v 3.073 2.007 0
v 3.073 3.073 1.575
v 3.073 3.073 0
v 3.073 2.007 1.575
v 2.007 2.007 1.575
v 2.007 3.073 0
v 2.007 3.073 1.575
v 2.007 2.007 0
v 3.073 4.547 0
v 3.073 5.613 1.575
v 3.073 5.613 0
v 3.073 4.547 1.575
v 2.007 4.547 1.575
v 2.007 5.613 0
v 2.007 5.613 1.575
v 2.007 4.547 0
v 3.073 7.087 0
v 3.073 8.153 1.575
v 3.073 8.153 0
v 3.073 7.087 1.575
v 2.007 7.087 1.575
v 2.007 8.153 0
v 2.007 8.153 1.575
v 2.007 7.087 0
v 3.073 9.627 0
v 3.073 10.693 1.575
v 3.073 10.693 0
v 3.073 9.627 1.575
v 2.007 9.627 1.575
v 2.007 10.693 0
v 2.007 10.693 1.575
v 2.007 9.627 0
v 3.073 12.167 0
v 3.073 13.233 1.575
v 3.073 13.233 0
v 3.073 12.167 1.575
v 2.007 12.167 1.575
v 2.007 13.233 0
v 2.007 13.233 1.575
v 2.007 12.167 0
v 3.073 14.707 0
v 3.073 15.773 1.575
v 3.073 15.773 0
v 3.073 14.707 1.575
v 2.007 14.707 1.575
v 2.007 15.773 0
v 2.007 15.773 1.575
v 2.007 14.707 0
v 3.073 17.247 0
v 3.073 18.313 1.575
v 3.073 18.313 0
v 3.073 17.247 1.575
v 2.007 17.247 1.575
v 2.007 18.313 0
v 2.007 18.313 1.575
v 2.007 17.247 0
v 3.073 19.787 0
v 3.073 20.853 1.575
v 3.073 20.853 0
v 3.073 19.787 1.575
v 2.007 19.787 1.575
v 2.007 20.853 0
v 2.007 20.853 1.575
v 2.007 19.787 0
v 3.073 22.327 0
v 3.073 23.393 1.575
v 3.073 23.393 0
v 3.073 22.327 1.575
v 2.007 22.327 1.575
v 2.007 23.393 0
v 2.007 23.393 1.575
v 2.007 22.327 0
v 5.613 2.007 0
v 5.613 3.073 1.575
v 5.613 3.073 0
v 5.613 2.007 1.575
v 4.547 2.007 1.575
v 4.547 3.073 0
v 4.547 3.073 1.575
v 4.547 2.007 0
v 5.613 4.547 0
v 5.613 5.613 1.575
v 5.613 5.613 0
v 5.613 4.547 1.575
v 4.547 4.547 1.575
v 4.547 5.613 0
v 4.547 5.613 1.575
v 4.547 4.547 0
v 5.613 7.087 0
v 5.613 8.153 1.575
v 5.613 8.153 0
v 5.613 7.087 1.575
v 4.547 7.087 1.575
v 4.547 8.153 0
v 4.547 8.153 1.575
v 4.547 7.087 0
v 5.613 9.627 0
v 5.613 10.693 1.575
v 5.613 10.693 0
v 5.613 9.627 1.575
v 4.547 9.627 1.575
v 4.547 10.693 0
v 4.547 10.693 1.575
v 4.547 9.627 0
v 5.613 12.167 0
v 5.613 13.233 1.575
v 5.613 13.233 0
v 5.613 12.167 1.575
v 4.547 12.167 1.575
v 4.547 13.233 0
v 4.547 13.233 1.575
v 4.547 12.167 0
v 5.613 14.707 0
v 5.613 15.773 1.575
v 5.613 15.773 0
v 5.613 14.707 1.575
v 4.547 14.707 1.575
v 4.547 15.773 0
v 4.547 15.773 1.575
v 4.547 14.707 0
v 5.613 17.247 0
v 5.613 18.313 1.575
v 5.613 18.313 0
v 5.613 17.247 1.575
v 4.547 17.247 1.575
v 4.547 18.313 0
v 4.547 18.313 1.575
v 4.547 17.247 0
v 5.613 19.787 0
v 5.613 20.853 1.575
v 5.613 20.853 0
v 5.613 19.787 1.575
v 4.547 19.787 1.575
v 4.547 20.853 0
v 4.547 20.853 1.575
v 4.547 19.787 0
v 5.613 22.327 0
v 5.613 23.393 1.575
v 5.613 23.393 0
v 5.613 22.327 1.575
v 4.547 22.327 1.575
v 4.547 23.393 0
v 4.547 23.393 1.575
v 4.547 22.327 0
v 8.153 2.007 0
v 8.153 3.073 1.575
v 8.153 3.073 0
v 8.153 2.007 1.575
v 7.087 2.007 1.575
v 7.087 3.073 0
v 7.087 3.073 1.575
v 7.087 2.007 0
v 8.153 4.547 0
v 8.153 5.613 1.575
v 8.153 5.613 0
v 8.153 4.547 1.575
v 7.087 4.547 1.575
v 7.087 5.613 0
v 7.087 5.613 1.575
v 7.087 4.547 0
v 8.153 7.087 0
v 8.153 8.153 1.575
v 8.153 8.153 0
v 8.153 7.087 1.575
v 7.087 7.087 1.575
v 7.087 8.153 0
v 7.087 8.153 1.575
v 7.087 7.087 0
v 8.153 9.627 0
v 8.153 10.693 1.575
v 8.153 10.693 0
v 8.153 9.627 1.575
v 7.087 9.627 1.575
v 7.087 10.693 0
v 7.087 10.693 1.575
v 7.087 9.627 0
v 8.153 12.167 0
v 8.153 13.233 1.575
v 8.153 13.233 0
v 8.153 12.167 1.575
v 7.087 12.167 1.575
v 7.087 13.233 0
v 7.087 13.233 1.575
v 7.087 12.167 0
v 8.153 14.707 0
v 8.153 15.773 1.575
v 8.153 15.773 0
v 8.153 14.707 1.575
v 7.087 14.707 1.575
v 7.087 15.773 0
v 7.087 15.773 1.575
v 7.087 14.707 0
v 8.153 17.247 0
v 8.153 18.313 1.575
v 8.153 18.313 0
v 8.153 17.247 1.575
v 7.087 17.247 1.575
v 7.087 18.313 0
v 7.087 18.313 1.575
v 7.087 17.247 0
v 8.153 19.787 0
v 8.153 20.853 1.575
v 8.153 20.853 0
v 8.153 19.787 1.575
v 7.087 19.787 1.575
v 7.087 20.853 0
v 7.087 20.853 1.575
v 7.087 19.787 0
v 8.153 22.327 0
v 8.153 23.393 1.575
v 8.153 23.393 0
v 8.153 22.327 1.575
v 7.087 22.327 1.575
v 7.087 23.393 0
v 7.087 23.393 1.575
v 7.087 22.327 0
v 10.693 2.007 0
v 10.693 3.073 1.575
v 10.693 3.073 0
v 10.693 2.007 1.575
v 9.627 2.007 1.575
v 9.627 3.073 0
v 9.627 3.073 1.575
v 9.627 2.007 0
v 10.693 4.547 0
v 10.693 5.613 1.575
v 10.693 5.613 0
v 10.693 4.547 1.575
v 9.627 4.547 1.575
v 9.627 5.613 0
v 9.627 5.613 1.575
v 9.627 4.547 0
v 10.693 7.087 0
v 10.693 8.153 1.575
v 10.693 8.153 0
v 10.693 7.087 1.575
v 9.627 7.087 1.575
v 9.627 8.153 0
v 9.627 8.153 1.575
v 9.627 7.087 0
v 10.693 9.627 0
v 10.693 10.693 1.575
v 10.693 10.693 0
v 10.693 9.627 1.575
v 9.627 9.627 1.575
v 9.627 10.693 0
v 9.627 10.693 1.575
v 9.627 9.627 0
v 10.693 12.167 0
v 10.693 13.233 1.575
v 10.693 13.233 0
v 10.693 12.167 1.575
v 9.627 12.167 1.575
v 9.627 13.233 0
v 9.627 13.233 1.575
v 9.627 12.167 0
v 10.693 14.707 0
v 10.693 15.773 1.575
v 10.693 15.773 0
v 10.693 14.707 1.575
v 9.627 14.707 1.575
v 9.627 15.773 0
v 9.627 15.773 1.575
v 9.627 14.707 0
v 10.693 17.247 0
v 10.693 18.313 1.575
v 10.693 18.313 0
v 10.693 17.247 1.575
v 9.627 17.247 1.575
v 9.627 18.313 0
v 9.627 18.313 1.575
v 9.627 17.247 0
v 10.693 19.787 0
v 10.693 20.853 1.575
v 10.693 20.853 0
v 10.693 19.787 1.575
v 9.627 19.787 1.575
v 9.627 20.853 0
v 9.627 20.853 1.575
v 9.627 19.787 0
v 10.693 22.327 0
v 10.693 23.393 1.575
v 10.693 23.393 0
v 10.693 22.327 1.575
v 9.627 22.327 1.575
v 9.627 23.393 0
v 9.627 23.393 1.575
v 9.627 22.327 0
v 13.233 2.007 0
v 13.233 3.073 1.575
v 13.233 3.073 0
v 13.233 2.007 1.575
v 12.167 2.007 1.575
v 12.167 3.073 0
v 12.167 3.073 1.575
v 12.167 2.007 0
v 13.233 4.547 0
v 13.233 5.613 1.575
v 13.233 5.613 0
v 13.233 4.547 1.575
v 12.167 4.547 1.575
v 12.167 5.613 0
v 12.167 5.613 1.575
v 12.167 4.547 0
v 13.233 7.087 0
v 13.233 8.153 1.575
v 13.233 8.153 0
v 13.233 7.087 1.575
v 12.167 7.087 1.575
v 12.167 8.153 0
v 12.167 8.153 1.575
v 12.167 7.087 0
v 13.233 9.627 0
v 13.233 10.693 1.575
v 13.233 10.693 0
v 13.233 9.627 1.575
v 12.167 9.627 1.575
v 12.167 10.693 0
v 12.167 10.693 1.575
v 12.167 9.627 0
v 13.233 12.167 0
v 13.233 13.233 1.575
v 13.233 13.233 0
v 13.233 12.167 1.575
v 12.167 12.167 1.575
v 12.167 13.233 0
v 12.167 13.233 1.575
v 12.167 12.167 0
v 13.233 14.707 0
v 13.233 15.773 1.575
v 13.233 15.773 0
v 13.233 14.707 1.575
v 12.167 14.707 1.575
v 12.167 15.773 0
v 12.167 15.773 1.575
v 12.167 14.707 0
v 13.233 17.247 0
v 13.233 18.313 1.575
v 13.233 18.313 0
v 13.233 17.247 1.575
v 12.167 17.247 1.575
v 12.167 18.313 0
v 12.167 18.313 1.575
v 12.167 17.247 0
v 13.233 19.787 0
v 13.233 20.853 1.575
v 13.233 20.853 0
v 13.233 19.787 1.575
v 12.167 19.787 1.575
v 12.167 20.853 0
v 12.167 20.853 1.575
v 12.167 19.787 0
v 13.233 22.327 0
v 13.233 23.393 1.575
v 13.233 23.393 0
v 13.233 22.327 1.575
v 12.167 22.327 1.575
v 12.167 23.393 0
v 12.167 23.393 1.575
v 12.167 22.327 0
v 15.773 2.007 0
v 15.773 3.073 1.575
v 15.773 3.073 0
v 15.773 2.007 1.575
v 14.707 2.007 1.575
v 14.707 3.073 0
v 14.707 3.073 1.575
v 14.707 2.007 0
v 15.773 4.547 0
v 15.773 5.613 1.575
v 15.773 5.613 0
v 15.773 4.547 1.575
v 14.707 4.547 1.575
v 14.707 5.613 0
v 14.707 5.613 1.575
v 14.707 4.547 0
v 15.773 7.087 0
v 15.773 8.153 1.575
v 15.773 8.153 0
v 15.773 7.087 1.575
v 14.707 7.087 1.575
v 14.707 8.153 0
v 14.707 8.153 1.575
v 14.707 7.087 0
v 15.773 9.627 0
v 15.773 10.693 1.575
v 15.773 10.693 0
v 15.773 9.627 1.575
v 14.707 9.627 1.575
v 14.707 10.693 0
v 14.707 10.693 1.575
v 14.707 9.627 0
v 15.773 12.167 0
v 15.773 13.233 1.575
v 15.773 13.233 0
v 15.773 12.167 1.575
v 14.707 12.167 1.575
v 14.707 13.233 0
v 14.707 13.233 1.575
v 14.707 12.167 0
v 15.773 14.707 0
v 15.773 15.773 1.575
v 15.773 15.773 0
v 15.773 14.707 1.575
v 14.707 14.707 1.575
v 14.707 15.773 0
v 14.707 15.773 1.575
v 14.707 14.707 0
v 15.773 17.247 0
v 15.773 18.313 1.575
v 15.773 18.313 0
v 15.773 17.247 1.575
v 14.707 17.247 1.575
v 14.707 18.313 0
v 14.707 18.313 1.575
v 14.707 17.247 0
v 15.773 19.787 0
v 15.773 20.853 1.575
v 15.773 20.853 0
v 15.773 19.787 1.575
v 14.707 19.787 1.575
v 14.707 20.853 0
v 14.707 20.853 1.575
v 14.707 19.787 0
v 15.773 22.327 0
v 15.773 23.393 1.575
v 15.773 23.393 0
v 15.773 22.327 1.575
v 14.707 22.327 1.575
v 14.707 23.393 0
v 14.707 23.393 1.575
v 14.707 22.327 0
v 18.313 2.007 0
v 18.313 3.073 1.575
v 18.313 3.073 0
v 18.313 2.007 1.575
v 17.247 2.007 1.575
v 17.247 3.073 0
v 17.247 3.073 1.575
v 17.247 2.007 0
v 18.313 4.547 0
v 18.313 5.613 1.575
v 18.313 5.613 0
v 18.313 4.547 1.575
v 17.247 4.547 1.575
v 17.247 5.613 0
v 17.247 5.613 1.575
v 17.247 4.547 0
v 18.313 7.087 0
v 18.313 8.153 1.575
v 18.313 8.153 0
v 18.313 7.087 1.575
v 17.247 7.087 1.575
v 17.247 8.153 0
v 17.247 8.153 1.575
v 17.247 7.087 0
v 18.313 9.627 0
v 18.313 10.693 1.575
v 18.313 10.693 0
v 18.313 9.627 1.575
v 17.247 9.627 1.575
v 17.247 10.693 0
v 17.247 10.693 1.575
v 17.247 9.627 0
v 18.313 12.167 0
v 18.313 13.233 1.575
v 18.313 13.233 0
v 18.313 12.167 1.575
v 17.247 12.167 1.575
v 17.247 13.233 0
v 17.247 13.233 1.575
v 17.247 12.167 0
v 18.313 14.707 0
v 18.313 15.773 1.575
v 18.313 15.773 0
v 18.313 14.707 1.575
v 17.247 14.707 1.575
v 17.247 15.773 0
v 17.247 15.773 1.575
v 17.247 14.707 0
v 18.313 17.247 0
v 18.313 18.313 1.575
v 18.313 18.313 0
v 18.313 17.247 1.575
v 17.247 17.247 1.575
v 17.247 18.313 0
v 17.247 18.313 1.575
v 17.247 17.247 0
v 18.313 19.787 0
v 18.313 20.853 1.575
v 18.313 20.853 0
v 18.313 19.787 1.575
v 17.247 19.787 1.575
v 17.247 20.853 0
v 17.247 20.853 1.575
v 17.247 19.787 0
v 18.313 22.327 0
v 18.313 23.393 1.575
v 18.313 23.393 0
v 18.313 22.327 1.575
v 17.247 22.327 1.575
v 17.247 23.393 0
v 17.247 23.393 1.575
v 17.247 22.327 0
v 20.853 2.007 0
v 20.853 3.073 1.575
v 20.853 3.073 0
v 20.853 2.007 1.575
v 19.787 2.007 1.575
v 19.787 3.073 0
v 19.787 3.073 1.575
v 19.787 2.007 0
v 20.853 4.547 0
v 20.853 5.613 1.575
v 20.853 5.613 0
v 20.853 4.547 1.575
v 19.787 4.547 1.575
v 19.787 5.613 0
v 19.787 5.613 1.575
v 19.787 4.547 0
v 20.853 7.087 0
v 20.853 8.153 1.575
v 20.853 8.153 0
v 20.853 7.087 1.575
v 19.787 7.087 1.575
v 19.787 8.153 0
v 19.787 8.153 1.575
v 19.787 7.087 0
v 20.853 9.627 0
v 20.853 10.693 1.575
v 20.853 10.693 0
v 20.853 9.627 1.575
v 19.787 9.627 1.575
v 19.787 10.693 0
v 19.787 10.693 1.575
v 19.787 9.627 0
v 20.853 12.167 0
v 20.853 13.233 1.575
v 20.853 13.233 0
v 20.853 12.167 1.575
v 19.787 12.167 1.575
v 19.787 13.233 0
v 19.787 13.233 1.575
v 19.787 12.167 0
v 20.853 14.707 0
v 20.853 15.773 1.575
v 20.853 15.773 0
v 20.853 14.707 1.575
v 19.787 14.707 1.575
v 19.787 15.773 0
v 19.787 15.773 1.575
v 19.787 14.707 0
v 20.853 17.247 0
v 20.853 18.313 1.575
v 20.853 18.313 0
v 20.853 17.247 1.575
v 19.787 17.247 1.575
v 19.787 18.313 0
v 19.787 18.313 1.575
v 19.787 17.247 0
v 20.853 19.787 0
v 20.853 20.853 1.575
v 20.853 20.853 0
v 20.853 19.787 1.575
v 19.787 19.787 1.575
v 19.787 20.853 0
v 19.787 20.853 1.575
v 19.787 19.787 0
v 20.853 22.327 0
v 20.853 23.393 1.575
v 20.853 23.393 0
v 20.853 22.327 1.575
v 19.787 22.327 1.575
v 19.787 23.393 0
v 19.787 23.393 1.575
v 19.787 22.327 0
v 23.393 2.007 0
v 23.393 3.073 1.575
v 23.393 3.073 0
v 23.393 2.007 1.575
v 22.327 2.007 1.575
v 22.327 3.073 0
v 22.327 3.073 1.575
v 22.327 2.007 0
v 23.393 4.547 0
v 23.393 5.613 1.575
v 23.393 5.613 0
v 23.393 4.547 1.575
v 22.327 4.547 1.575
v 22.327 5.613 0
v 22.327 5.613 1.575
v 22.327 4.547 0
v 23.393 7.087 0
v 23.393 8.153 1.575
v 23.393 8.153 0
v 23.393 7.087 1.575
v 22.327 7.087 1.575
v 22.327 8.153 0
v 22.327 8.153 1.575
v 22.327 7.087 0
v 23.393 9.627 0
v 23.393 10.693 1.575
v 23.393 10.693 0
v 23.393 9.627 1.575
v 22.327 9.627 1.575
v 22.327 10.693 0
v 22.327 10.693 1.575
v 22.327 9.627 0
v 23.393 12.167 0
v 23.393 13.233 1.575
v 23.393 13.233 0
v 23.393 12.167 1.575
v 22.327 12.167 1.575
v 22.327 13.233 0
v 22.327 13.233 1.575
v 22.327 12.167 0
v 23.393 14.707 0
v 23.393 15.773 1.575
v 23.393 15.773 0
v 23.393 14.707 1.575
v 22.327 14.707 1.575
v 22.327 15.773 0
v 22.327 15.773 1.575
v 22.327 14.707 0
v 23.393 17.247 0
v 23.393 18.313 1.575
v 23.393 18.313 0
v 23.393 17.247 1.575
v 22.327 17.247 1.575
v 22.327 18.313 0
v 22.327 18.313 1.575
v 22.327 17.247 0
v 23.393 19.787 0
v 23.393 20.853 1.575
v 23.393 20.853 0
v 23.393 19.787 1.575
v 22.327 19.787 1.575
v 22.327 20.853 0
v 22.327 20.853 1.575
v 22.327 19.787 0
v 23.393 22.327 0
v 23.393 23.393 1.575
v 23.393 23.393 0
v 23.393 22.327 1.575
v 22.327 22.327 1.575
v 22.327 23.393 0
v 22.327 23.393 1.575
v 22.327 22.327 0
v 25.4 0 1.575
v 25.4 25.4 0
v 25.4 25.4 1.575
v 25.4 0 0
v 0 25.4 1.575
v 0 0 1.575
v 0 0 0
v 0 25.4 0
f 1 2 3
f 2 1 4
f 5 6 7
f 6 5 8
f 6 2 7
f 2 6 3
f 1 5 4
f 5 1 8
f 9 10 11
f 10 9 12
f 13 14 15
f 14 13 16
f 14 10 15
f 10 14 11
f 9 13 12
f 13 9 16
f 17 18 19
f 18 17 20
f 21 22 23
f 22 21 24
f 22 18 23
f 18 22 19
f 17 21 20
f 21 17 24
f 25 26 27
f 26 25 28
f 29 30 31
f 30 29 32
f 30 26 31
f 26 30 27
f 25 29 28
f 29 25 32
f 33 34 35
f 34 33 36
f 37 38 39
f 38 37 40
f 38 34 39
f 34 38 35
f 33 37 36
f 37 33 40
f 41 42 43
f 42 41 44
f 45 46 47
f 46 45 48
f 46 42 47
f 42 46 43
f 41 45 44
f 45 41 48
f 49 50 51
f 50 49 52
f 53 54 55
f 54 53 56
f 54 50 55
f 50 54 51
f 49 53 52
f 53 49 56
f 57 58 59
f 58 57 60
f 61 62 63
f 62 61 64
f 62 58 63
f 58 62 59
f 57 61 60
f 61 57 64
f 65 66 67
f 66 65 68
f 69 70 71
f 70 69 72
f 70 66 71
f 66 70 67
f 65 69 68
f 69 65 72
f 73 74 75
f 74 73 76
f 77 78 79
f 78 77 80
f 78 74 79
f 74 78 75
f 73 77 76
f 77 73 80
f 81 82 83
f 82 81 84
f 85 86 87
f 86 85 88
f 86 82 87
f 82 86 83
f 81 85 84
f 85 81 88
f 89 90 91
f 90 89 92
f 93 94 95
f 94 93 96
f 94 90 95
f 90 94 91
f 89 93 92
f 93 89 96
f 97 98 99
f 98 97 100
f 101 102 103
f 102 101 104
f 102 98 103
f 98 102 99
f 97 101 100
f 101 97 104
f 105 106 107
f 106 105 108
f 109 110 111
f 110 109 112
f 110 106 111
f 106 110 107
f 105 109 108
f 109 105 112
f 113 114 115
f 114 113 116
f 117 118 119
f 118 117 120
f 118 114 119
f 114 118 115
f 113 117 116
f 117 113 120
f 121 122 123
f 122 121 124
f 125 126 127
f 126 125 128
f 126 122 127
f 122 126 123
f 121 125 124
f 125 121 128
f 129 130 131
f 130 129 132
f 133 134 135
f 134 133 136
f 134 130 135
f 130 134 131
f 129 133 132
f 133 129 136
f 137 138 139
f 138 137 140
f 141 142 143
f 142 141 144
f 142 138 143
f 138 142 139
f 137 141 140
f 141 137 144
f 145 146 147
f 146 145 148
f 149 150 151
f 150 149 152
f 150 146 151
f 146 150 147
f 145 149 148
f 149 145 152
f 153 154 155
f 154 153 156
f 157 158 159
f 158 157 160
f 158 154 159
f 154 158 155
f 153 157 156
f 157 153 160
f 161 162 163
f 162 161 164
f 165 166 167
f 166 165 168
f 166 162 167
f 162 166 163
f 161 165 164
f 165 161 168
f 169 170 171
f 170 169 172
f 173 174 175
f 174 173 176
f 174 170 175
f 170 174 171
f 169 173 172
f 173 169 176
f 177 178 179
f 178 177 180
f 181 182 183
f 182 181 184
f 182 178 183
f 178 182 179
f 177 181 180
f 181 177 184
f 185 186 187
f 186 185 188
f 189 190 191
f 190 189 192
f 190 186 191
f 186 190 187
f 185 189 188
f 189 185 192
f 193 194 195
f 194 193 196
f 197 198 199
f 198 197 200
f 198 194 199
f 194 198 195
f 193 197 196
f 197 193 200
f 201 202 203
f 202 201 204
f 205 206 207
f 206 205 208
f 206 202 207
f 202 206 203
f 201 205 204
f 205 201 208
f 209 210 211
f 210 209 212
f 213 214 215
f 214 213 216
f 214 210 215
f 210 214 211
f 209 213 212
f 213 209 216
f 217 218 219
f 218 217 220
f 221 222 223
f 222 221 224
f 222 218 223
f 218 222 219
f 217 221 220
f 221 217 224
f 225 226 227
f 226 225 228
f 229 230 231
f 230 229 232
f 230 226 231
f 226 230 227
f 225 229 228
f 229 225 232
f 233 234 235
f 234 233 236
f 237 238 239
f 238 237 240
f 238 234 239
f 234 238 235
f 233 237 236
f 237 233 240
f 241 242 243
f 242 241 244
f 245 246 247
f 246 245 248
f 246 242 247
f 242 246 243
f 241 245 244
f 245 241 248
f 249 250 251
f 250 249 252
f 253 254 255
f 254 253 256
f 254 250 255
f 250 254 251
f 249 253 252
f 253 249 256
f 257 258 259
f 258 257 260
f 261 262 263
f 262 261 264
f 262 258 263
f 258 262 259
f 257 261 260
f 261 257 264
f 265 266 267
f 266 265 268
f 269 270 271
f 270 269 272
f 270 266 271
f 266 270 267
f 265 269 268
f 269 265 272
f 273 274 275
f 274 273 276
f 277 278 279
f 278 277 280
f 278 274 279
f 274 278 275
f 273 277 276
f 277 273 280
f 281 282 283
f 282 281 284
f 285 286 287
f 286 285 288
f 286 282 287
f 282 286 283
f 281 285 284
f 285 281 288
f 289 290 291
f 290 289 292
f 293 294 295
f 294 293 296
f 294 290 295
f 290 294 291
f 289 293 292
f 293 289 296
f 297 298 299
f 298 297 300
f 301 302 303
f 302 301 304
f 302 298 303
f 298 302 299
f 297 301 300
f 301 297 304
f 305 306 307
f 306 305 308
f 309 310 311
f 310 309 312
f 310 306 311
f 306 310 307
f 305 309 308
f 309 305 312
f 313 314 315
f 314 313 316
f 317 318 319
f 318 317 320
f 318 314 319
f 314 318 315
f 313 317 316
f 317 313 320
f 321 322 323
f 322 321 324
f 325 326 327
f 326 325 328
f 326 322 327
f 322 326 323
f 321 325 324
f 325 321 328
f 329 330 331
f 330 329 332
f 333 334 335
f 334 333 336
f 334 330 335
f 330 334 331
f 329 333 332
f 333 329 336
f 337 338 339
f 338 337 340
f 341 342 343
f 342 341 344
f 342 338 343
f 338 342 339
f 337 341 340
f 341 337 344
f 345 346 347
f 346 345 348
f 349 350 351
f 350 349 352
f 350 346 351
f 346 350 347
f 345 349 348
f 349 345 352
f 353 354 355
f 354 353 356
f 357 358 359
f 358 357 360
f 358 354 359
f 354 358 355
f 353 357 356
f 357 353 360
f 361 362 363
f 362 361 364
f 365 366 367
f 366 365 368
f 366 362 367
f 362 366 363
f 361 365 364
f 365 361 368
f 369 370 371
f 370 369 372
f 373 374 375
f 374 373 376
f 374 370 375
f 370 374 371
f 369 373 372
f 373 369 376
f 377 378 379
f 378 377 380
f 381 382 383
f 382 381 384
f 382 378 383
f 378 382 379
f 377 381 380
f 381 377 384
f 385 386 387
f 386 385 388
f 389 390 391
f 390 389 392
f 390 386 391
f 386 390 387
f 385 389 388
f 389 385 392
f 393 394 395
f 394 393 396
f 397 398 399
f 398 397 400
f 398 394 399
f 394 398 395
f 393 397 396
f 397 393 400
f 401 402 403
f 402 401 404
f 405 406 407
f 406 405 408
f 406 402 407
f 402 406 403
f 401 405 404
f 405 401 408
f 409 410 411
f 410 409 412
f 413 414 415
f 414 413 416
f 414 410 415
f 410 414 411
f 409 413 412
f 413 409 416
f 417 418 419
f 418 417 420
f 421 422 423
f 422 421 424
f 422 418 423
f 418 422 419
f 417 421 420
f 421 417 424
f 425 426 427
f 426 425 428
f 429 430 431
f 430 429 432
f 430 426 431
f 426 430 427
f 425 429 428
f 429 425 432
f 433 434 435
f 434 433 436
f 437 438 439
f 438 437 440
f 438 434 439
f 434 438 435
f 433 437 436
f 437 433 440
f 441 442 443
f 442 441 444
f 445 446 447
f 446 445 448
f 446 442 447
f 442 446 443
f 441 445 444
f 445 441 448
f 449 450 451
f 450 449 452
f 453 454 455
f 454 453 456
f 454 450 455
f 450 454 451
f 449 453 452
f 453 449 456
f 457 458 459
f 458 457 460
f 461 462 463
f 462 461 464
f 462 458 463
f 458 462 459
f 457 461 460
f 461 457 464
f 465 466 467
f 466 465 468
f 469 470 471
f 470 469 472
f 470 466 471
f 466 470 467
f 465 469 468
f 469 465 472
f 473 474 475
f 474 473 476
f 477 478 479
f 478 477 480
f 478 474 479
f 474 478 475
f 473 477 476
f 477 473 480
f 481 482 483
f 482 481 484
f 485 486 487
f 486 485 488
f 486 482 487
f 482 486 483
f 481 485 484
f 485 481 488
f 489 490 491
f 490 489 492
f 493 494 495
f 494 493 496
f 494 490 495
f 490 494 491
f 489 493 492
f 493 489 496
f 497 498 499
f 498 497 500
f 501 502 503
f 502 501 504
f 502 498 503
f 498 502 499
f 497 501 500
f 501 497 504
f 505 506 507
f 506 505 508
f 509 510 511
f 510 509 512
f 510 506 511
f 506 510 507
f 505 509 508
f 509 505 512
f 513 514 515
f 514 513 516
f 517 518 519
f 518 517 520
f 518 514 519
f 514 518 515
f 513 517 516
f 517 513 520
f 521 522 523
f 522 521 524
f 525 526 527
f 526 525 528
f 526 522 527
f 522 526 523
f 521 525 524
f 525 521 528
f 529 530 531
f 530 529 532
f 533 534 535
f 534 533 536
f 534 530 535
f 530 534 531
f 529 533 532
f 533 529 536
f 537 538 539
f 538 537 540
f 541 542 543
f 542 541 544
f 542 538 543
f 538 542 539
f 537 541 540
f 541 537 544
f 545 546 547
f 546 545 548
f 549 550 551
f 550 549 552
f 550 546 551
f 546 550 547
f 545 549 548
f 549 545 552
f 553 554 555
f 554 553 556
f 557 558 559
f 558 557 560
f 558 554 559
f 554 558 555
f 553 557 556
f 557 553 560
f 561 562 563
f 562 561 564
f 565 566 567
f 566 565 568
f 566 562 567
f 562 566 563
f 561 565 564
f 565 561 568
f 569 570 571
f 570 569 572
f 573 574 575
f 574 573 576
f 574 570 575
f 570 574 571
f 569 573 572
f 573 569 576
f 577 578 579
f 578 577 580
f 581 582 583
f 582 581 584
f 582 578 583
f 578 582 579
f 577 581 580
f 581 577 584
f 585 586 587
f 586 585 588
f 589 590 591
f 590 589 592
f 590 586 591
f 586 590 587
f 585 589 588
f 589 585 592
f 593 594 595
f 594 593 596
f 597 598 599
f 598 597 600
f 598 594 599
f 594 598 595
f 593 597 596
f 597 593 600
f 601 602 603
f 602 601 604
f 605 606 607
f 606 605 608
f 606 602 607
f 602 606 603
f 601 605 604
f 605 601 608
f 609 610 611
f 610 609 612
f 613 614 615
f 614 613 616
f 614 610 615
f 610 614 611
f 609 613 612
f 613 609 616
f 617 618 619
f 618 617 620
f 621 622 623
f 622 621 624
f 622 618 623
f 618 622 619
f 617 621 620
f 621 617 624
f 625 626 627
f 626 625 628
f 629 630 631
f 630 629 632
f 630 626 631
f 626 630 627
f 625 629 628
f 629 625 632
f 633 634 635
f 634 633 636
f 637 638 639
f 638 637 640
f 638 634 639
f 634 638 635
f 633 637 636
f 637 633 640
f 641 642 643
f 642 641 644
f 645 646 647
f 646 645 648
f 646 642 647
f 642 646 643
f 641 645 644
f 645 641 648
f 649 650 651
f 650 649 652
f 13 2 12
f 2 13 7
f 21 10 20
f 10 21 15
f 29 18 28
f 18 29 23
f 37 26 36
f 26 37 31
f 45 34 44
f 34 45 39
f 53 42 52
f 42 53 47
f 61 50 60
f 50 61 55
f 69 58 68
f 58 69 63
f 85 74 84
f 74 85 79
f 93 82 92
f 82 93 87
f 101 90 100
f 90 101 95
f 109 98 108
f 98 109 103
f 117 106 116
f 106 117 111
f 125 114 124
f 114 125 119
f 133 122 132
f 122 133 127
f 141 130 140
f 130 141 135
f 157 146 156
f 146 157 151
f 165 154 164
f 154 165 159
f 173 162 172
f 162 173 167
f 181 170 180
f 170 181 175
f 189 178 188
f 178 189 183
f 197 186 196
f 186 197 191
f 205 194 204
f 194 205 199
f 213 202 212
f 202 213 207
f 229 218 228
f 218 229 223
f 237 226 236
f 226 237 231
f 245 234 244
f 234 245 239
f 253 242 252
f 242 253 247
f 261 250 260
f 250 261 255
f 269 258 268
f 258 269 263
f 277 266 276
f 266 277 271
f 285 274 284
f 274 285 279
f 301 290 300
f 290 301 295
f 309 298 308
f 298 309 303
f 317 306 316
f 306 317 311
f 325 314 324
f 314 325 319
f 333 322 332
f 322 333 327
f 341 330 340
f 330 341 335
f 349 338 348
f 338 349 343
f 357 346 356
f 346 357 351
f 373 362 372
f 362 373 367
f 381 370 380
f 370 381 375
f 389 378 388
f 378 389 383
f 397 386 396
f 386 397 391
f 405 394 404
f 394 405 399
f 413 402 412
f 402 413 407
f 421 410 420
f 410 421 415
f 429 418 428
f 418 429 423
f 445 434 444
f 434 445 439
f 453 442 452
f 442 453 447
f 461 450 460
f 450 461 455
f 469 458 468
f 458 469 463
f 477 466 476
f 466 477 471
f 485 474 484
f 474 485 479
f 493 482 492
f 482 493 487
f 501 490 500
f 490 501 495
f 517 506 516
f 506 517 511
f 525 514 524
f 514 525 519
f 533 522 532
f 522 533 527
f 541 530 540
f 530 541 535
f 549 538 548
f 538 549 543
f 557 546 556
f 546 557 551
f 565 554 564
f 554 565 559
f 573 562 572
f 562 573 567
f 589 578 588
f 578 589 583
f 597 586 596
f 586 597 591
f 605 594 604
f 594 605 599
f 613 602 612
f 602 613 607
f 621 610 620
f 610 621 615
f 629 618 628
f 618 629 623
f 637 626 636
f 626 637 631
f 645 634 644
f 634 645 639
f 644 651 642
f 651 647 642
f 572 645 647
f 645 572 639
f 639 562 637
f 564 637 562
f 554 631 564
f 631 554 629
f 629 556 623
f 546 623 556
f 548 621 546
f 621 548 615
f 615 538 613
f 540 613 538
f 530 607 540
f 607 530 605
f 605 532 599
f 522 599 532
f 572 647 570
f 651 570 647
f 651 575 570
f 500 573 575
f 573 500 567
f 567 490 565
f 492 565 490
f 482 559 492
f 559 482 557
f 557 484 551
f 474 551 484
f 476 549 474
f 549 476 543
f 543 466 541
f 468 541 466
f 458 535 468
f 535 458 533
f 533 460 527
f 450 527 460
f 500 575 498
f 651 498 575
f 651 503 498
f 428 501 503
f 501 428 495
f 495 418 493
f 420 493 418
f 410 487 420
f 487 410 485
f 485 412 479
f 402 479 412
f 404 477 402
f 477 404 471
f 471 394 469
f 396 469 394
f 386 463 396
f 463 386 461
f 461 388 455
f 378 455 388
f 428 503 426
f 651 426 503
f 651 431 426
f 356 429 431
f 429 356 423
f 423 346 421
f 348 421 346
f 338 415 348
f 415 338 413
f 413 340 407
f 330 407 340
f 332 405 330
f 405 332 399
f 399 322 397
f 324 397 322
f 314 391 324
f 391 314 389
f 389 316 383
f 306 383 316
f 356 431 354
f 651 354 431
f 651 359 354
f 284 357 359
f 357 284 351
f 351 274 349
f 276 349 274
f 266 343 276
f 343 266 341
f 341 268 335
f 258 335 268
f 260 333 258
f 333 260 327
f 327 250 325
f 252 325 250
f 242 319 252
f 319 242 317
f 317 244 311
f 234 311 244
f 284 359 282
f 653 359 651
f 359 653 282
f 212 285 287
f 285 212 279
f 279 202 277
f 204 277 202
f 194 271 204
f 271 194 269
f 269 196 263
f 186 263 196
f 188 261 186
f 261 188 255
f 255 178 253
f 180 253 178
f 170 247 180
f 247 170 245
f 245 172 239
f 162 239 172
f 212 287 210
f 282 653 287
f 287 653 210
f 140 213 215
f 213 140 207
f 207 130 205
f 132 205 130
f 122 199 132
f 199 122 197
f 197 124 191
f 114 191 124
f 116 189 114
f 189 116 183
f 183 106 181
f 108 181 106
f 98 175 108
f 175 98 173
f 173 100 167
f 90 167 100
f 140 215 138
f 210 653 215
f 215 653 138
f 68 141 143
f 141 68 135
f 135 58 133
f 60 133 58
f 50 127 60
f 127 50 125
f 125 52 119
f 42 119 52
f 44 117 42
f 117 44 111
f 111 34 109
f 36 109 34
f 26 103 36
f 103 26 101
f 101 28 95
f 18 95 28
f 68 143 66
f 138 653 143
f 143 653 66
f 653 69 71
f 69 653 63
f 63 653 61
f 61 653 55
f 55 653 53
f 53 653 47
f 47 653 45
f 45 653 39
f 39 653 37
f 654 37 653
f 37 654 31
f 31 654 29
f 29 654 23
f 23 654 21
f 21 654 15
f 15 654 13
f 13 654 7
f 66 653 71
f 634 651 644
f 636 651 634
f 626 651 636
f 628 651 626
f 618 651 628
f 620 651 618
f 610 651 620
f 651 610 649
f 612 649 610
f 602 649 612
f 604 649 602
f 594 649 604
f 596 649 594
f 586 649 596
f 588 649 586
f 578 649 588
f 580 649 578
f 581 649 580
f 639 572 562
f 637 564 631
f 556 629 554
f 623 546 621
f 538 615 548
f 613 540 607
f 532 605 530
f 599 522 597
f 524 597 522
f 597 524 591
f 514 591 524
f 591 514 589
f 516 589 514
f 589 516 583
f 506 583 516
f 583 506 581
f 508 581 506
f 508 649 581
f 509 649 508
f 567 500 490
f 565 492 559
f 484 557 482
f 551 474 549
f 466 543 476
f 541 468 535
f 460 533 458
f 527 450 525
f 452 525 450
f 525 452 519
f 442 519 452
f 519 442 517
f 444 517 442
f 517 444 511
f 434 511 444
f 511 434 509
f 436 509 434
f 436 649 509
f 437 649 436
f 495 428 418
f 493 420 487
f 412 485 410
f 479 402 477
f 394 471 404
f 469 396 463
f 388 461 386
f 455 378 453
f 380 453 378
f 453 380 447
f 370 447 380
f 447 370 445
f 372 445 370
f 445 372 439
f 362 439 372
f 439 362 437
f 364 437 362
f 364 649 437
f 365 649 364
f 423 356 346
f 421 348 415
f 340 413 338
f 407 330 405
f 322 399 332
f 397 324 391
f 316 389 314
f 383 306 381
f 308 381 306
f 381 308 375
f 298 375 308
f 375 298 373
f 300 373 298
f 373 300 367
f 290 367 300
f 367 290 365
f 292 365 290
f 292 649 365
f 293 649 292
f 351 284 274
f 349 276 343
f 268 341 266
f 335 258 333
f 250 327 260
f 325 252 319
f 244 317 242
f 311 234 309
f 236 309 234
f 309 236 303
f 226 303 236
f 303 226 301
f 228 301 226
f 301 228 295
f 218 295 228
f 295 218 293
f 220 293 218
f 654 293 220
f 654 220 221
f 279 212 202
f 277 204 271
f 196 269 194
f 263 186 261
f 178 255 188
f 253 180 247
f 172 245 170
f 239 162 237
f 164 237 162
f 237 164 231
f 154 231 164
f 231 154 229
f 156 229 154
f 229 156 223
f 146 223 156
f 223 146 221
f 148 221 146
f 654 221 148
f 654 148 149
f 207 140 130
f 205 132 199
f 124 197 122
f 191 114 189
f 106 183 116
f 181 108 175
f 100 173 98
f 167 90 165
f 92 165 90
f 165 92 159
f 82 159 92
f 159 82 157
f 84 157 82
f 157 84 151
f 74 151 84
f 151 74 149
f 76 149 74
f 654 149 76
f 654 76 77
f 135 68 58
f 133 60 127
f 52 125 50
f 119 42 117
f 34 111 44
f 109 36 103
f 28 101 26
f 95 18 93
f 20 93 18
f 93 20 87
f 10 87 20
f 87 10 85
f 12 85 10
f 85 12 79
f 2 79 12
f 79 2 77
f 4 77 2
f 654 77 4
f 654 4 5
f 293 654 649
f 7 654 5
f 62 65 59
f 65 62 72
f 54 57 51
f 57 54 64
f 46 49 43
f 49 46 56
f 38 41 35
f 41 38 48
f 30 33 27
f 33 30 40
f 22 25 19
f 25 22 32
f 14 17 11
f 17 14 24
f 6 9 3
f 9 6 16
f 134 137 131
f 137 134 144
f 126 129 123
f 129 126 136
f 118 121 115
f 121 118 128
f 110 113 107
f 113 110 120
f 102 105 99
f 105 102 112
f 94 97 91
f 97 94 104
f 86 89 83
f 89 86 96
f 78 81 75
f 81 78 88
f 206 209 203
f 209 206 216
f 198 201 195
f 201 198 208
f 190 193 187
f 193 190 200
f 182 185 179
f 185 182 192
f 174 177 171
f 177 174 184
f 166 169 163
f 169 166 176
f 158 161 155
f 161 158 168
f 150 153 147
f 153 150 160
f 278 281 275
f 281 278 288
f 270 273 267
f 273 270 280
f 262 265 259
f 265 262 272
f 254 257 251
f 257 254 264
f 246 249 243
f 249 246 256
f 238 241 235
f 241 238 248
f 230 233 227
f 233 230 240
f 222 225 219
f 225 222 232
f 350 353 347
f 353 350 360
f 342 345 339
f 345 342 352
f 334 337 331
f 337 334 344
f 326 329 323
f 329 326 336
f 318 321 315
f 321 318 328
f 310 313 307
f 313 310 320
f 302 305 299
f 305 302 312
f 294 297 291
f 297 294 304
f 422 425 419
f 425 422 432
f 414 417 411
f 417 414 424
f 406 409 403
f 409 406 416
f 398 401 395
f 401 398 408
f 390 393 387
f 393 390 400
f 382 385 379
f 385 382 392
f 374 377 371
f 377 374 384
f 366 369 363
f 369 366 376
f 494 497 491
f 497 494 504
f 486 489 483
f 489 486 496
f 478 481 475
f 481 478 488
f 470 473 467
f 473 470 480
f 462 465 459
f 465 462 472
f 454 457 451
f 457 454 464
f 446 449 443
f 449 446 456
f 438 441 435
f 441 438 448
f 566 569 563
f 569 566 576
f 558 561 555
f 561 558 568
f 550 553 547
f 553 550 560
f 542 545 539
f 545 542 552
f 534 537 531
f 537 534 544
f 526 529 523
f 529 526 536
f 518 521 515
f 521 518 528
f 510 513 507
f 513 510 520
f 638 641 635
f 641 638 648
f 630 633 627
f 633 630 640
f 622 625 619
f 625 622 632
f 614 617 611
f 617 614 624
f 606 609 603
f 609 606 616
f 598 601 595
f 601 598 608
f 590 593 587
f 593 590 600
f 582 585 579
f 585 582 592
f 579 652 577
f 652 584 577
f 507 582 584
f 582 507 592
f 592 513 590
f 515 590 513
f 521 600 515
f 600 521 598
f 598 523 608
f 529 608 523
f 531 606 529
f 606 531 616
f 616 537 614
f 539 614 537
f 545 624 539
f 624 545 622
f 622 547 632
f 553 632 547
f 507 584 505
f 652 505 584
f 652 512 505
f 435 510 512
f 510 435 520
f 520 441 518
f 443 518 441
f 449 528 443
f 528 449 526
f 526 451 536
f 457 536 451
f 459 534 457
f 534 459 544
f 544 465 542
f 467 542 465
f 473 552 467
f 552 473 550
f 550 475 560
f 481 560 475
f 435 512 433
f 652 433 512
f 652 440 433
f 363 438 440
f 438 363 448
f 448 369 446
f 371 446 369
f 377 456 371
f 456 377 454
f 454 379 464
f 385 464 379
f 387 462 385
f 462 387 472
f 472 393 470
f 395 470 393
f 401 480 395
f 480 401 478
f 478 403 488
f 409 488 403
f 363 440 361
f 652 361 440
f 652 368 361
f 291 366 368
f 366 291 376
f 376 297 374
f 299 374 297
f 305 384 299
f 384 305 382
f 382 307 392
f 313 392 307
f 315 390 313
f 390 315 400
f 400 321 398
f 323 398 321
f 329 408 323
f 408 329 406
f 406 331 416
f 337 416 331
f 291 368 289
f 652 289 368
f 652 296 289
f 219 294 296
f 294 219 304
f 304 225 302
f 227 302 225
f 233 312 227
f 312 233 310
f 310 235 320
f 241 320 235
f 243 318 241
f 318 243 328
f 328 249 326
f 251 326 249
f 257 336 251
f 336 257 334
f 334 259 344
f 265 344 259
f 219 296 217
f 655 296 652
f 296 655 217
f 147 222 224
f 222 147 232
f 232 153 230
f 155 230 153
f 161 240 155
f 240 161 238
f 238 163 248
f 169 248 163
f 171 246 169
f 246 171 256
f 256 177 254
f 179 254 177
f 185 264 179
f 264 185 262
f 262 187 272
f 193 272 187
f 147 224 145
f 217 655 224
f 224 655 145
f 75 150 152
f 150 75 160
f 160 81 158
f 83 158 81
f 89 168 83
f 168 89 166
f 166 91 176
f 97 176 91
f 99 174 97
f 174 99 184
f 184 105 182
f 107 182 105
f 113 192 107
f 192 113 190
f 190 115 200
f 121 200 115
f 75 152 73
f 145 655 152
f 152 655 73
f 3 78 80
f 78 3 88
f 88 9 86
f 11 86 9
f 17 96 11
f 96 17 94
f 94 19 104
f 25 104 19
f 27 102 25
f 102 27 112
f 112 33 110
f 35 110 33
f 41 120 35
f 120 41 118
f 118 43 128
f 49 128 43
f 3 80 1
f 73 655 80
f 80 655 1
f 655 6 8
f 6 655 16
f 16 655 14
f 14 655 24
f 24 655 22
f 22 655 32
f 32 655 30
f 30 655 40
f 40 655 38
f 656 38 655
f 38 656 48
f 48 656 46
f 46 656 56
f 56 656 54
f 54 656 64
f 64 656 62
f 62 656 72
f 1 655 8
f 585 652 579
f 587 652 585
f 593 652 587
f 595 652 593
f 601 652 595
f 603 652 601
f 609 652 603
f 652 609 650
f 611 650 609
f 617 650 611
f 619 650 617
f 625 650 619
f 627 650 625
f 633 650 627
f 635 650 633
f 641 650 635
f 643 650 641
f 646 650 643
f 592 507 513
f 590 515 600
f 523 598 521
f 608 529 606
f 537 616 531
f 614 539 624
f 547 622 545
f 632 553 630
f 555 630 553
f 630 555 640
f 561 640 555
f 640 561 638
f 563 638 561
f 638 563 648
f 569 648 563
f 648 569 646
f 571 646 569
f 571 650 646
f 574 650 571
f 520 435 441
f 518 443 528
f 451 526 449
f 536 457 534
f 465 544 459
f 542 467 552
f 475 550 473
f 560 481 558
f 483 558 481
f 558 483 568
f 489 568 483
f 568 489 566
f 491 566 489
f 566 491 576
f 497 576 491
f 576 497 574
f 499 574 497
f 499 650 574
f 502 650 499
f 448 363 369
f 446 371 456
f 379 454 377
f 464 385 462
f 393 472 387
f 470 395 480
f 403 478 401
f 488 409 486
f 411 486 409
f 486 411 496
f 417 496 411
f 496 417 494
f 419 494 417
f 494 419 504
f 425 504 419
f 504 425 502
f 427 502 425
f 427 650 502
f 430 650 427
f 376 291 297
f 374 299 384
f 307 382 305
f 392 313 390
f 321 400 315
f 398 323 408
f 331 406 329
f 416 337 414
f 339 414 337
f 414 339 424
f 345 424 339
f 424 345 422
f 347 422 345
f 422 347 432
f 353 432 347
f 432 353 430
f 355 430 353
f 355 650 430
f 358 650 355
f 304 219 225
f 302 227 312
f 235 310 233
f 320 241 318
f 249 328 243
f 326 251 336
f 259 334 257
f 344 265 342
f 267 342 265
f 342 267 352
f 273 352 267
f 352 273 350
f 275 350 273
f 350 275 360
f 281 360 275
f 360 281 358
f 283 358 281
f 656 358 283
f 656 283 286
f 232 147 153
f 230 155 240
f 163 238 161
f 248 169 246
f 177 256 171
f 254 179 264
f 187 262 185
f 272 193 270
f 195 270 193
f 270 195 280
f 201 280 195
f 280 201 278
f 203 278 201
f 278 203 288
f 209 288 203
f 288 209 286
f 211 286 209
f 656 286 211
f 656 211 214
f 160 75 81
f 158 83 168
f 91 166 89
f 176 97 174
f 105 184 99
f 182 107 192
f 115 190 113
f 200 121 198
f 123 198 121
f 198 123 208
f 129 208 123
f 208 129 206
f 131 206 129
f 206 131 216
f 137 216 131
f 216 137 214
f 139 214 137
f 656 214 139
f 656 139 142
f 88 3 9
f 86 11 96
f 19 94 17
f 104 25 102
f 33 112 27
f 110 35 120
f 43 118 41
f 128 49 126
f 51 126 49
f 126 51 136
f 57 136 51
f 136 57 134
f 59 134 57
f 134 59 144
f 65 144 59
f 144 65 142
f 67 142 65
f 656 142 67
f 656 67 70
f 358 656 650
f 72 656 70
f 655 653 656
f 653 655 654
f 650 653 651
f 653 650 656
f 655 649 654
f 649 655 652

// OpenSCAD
// Perfboard Generator
// Author: Wing Tang Wong
// Description: parametrically create a normal perfboard of a given
//              dimension.
// 

/*Customizer Variables*/
/*[Perfboard]*/
board_width = 1;
board_length = 1;
hole_spacing = 0.10; //[0.05:0.05 inch(compact), 0.10:0.10 inch(normal)]
hole_diameter = 0.042; //[0.028:0.028 inch(compact), 0.035:0.035 inch(normal/plated), 0.042:0.042 inch(normal)]

metric_or_imperial = 25.4; //[1:Metric, 25.4:Imperial]


/*[Hidden]*/
// Perfboard generator
$FN=8;
spacing=hole_spacing * metric_or_imperial  ; // 0.1" spacing or 2.54mm spacing of the holes.
holes=(hole_diameter * metric_or_imperial) ; // 0.042" or 1.0668mm holes

board_w =  board_width * metric_or_imperial ; // 4"
board_l = board_length * metric_or_imperial ; // 4"

board_h = 0.062 * 25.4 ; // 0.062" or 1.6mm height 

x_max = ( ( board_w - ( 2 * spacing ) ) / spacing );
y_max = ( ( board_l - ( 2 * spacing ) ) / spacing );

difference() {
	cube( [ board_w, board_l, board_h ] );

for (x = [0:x_max]) 
{
	for(y = [0:y_max])
	{
    translate([(x * spacing) + spacing , (y * spacing) + spacing ,0]) 
		cube( [holes, holes, board_h * 4] , center = true );
    //translate([(x * spacing) + spacing , (y * spacing) + spacing ,0]) 
	//	cylinder( r=holes/2.00 , h = board_h * 4 );
	};	
};

};
